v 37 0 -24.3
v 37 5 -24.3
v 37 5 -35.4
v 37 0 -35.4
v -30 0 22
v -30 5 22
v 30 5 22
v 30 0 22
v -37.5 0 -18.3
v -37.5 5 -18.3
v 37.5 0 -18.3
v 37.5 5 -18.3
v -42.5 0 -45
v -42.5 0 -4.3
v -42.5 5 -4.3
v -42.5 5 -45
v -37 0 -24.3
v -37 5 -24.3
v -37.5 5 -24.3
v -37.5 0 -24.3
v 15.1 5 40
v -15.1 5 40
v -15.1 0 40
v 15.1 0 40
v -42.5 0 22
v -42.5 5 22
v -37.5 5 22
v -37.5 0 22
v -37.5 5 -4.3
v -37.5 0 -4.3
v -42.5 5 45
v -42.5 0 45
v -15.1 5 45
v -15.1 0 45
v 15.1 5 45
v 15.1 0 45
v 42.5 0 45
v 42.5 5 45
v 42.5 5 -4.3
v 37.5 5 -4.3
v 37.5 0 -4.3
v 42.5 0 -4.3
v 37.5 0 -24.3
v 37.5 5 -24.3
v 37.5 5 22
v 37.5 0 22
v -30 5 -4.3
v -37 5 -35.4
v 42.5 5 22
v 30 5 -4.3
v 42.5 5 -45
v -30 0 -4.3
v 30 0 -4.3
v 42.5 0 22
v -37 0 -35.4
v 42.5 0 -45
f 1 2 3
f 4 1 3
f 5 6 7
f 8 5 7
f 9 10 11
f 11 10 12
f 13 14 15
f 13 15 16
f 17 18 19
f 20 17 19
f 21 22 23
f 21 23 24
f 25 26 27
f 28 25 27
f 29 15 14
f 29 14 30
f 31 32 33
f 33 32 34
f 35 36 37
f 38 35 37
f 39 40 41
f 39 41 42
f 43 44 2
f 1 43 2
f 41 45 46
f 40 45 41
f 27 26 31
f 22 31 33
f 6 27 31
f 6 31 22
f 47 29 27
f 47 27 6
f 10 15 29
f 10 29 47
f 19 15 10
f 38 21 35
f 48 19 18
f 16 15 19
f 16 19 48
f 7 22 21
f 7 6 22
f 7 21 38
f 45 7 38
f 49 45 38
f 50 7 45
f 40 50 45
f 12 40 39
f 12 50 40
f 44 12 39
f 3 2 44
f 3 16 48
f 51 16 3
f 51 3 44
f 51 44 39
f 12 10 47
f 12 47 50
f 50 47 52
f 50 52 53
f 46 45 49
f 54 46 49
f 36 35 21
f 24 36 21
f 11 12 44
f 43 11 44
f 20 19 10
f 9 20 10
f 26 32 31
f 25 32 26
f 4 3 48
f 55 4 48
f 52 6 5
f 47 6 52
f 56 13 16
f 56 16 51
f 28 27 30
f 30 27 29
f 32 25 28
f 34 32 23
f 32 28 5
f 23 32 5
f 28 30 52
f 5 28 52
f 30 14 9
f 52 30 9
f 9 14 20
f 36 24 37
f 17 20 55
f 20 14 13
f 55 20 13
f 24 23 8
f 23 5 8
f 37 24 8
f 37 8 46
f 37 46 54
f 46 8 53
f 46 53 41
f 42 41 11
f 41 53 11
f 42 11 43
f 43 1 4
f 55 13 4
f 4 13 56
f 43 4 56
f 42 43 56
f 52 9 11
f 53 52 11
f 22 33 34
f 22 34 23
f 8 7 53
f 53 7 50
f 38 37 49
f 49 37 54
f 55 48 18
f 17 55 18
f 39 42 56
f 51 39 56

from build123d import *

# Parameters (mm, degrees)
SKETCH1_W           = 85
SKETCH1_H           = 90
BOSS_EXTRUDE1_DEPTH = 5
SKETCH2_W           = 60
SKETCH2_H           = 26.3
CUT_EXTRUDE2_DEPTH  = 7.5
SKETCH4_W           = 5
SKETCH4_H           = 26.3
CUT_EXTRUDE3_DEPTH  = 7.5
SKETCH5_W           = 30.2
SKETCH5_H           = 5
CUT_EXTRUDE4_DEPTH  = 5


with BuildPart() as part:
    # Sketch1 → Boss-Extrude1 (new body)
    with BuildSketch(Plane(origin=(0, 0, 0), x_dir=(1, 0, 0), z_dir=(0, 1, 0))):
        Rectangle(SKETCH1_W, SKETCH1_H)
    extrude(amount=BOSS_EXTRUDE1_DEPTH)

    # Sketch2 → Cut-Extrude2 (cut)
    with BuildSketch(Plane(origin=(0, 5, 0), x_dir=(1, 0, 0), z_dir=(0, 1, 0))):
        with Locations((0, -8.85)):
            Rectangle(SKETCH2_W, SKETCH2_H)
        Polygon((37.5, 24.3), (37, 24.3), (37, 35.4), (-37, 35.4), (-37, 24.3), (-37.5, 24.3), (-37.5, 18.3), (37.5, 18.3), align=None)
    extrude(amount=-CUT_EXTRUDE2_DEPTH, mode=Mode.SUBTRACT)

    # Sketch4 → Cut-Extrude3 (cut)
    with BuildSketch(Plane(origin=(0, 5, 0), x_dir=(1, 0, 0), z_dir=(0, 1, 0))):
        with Locations((-40, -8.85)):
            Rectangle(SKETCH4_W, SKETCH4_H)
        with Locations((40, -8.85)):
            Rectangle(SKETCH4_W, SKETCH4_H)
    extrude(amount=-CUT_EXTRUDE3_DEPTH, mode=Mode.SUBTRACT)

    # Sketch5 → Cut-Extrude4 (cut)
    with BuildSketch(Plane(origin=(0, 5, 0), x_dir=(1, 0, 0), z_dir=(0, 1, 0))):
        with Locations((0, -42.5)):
            Rectangle(SKETCH5_W, SKETCH5_H)
    extrude(amount=-CUT_EXTRUDE4_DEPTH, mode=Mode.SUBTRACT)


solid = part.part
